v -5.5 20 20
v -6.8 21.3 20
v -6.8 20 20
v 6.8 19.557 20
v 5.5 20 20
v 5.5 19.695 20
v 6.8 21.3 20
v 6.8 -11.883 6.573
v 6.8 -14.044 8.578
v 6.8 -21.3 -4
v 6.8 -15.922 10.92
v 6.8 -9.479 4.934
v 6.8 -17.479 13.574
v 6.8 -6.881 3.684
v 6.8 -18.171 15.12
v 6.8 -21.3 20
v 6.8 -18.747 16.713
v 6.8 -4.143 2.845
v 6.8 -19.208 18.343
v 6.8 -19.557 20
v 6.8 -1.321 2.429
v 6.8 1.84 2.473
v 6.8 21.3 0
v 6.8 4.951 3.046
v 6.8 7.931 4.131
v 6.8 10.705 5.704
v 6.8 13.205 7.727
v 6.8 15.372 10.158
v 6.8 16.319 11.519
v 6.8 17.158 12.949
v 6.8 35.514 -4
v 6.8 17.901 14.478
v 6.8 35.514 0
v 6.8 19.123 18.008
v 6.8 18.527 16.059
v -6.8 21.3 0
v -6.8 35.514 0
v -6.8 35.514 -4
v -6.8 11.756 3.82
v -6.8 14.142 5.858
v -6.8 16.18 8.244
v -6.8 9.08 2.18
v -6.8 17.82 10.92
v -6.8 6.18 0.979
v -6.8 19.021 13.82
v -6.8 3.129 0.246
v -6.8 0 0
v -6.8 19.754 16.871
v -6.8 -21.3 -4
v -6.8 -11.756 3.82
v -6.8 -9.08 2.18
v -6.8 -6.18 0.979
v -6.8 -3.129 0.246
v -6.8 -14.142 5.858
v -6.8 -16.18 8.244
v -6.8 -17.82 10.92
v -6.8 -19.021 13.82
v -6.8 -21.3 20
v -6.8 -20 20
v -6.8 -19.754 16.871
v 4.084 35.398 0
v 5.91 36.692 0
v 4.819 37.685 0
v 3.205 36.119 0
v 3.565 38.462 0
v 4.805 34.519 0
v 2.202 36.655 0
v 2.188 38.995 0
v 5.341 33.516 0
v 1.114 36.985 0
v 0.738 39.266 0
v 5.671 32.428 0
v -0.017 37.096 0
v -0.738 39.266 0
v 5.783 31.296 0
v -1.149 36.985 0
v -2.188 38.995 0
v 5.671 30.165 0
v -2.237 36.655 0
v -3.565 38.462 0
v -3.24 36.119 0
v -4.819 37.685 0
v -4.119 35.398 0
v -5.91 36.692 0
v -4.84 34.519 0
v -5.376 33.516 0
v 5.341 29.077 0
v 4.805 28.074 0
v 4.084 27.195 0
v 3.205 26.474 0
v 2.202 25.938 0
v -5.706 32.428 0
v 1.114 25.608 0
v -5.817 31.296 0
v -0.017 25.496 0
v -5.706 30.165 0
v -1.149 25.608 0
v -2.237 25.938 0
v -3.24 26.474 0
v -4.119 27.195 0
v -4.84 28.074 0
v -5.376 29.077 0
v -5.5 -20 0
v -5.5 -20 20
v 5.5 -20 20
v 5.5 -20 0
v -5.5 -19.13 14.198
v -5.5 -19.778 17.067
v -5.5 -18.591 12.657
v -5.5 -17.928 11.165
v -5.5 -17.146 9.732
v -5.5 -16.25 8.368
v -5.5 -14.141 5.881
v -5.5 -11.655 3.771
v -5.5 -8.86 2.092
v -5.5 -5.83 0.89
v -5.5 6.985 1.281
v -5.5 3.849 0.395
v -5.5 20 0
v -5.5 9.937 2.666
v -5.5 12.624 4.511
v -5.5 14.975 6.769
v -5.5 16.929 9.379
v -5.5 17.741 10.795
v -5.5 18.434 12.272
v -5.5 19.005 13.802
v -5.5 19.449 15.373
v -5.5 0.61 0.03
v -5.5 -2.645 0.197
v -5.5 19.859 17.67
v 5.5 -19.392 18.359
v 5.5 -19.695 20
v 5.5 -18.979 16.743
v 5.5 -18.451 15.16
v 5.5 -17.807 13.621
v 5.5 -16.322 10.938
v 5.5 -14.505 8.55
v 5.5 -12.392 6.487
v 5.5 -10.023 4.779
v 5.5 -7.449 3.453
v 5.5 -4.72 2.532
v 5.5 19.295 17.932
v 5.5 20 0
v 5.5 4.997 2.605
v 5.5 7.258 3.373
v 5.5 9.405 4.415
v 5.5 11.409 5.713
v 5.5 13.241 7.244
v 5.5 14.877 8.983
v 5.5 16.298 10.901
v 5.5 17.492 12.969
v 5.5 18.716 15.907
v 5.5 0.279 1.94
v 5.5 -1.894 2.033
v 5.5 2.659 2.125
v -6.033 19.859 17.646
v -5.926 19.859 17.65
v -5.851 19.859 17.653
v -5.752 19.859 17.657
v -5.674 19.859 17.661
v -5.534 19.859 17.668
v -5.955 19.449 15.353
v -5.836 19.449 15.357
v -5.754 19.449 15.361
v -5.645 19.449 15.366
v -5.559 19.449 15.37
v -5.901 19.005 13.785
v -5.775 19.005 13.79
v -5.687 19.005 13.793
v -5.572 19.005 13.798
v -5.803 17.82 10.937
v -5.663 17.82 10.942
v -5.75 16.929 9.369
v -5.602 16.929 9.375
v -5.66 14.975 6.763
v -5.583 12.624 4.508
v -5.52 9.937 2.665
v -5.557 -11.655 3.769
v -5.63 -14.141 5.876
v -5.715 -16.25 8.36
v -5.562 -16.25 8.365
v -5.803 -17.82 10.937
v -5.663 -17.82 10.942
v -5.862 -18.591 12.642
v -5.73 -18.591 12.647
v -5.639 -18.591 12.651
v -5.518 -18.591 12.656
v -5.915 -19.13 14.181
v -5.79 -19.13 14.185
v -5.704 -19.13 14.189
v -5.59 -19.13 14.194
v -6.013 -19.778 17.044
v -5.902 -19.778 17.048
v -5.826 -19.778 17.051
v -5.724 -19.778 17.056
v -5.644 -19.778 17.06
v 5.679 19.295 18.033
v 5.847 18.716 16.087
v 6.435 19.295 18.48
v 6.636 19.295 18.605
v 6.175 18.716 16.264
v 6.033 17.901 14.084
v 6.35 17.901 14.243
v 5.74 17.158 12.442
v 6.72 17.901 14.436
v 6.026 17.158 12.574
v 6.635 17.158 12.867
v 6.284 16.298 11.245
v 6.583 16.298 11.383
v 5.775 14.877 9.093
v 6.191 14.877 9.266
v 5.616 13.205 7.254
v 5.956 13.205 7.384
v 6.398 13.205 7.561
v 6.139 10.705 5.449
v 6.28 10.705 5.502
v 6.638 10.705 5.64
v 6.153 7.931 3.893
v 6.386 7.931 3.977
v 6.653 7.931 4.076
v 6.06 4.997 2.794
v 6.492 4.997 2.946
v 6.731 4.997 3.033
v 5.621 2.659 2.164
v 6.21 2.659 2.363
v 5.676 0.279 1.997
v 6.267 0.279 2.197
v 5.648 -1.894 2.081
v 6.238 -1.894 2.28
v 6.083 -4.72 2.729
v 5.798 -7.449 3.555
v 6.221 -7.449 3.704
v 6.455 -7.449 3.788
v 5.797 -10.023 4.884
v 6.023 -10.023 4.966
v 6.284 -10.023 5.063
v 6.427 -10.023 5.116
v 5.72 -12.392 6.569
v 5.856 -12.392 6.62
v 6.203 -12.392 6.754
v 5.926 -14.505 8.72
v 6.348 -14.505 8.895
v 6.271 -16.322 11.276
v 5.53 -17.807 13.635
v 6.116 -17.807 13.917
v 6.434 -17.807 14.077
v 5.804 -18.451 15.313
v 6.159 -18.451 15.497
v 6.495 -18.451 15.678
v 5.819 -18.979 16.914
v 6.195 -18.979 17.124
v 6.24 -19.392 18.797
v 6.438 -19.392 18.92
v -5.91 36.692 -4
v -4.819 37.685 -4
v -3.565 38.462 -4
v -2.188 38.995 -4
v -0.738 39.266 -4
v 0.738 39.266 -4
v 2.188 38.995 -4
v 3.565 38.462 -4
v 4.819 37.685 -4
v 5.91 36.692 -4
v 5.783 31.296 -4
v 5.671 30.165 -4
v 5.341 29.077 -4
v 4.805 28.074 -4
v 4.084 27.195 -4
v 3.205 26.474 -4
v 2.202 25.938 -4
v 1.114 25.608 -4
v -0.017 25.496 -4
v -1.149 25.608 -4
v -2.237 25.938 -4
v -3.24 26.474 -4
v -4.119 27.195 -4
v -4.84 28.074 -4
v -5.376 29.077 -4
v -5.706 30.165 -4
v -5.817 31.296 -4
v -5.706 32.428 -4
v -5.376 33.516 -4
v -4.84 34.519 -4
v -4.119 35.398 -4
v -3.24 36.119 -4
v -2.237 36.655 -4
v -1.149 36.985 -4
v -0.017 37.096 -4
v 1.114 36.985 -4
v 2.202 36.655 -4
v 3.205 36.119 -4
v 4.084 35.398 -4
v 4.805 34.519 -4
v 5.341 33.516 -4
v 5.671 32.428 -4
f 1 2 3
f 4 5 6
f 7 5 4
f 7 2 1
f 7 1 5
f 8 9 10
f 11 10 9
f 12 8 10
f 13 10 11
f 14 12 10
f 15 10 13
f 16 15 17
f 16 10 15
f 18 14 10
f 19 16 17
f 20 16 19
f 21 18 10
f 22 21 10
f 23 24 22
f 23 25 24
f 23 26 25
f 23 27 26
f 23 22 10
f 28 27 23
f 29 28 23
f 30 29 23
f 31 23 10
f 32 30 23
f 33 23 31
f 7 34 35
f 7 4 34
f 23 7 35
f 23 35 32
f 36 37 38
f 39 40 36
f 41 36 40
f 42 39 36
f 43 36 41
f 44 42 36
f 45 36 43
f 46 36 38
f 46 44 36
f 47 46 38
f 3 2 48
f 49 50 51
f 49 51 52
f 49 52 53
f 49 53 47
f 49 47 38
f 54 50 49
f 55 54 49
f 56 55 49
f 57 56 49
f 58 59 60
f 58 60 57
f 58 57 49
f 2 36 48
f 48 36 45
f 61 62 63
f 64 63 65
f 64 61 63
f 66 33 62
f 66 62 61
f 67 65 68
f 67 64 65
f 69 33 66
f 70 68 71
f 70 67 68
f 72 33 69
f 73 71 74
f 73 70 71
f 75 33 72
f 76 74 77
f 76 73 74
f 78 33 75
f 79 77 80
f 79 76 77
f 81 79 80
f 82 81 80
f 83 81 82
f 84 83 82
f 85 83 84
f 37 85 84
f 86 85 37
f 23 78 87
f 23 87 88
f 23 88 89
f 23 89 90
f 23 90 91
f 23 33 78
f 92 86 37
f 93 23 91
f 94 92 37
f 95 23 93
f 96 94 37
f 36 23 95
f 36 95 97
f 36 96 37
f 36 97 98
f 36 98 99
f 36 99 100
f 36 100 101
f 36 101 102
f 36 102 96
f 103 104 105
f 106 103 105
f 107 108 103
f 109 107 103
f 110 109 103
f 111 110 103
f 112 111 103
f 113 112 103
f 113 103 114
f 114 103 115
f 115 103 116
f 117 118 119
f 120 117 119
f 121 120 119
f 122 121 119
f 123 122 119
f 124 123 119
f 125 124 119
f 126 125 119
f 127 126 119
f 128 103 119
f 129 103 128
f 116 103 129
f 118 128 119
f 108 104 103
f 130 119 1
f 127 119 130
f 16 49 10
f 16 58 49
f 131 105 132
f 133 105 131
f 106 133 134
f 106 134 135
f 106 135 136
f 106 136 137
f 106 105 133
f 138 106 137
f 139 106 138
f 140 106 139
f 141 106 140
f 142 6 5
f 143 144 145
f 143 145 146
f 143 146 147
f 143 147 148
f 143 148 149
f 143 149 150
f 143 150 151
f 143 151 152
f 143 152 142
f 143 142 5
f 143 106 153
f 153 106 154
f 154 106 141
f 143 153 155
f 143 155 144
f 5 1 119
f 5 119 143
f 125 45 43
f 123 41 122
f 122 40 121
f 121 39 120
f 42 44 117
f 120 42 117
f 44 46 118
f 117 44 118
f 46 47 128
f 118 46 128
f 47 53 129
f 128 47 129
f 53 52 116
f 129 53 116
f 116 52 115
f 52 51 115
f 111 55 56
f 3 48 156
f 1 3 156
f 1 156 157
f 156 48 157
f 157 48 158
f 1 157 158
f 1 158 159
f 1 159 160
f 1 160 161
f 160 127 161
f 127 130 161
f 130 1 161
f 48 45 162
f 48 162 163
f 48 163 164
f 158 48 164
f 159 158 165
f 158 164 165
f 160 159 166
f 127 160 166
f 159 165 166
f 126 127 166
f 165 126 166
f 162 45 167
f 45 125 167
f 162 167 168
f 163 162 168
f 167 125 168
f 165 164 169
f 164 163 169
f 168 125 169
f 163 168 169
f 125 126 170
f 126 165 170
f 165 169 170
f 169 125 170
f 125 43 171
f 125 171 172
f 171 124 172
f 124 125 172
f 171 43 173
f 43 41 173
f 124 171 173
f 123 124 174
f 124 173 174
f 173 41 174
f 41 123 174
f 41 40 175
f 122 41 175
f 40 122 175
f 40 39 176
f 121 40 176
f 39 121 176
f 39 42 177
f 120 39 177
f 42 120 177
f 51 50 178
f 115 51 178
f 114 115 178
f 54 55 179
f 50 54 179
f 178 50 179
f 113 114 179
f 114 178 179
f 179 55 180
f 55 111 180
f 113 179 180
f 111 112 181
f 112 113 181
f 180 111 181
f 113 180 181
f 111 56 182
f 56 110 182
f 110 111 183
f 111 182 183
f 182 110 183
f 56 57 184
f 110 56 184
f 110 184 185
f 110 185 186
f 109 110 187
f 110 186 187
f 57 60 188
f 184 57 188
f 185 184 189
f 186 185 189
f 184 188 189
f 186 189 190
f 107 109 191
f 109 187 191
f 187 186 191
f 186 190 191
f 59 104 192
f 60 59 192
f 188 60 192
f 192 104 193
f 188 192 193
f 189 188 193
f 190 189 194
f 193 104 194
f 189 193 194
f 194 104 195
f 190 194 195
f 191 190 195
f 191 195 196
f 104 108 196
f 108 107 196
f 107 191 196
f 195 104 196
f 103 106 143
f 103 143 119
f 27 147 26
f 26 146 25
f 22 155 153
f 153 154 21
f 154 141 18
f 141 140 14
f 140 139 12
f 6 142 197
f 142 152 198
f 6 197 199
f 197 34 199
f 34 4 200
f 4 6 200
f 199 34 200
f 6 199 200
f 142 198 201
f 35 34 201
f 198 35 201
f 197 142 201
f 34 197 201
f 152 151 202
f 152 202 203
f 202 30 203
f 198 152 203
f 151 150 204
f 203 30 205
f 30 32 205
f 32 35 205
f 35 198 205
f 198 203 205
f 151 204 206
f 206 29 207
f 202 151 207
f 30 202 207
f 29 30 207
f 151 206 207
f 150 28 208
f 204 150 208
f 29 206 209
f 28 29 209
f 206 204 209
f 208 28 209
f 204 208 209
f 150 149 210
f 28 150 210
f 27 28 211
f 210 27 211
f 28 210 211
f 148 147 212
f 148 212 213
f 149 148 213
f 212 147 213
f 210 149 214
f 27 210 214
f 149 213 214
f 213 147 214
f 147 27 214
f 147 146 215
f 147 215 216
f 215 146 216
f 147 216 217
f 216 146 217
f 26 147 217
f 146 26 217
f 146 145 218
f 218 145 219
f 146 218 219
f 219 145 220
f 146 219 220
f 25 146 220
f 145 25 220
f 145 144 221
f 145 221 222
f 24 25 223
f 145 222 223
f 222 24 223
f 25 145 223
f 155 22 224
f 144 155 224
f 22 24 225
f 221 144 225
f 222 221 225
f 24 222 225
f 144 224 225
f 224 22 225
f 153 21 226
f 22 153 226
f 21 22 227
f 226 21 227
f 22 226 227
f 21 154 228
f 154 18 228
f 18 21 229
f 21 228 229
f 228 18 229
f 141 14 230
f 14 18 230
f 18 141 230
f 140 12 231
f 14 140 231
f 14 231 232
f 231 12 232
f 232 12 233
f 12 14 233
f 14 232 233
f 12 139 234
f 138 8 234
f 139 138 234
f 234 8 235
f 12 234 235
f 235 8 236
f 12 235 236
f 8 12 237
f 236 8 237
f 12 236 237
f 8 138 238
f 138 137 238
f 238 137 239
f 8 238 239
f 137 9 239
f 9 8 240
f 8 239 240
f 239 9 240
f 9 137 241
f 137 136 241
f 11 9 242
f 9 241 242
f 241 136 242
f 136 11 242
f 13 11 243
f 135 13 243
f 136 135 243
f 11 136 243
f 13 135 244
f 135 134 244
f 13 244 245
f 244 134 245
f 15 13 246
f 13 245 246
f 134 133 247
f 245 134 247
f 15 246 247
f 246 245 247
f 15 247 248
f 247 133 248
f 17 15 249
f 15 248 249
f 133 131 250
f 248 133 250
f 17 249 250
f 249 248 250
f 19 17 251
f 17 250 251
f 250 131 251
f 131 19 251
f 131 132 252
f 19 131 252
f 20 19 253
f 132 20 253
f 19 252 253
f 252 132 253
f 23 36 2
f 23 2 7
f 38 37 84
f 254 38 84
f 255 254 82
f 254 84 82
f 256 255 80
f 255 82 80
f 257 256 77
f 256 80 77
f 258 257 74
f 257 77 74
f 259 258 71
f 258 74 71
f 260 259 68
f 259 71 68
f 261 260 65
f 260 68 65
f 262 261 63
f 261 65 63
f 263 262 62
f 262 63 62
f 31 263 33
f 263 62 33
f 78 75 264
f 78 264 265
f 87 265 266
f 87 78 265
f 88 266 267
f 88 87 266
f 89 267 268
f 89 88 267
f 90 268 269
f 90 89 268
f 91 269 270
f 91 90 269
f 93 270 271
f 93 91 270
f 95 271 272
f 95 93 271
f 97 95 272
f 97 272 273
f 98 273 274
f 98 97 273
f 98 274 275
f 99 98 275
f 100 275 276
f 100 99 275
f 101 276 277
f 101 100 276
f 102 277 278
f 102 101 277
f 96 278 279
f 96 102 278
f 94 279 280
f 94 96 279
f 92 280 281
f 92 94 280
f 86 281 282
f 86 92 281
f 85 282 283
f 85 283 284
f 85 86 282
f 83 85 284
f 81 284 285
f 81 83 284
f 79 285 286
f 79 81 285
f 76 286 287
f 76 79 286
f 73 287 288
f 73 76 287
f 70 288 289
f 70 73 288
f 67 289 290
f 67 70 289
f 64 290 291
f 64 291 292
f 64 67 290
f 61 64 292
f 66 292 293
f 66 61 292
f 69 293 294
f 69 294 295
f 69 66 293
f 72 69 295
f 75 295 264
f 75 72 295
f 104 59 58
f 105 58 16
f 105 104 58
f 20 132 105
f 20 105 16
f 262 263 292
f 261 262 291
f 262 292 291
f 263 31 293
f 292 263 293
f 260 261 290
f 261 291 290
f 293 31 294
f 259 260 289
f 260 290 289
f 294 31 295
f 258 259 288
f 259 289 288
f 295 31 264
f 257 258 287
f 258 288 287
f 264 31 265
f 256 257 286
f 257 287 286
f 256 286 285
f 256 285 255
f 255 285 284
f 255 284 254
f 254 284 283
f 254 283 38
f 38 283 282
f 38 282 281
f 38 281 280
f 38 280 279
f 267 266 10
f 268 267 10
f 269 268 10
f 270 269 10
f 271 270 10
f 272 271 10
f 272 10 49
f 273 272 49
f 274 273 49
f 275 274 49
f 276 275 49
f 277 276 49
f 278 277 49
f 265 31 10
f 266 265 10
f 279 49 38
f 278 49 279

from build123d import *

# Parameters (mm, degrees)
SKETCH001_W   = 13.6
SKETCH001_H   = 42.6
SKETCH001_W_2 = 11
SKETCH001_H_2 = 40
PAD_DEPTH     = 20
SKETCH002_R   = 20
SKETCH005_R   = 5.8
PAD001_DEPTH  = 4


with BuildPart() as part:
    # Sketch001 → Pad (new body)
    with BuildSketch(Plane.XY):
        Rectangle(SKETCH001_W, SKETCH001_H)
        Rectangle(SKETCH001_W_2, SKETCH001_H_2, mode=Mode.SUBTRACT)
    extrude(amount=PAD_DEPTH)

    # Sketch002 → Groove (revolve, cut)
    with BuildSketch(Plane(origin=(-6.8, 0, 0), x_dir=(0, -1, 0), z_dir=(-1, 0, 0))):
        with Locations((0, 20)):
            Circle(SKETCH002_R)
    revolve(axis=Axis((-6.8, 20, 40), (0, -1, 0)), mode=Mode.SUBTRACT)

    # Sketch005 → Pad001 (new body)
    with BuildSketch(Plane(origin=(0, 0, 0), x_dir=(1, 0, 0), z_dir=(0, 0, -1))):
        with BuildLine():
            Line((-6.8, 21.3), (6.8, 21.3))
            Line((6.8, 21.3), (6.8, -35.514262))
            ThreePointArc((-6.8, -35.514262), (0, -39.3), (6.8, -35.514262))
            Line((-6.8, -35.514262), (-6.8, 21.3))
        make_face()
        with Locations((-0.017483, -31.296471)):
            Circle(SKETCH005_R, mode=Mode.SUBTRACT)
    extrude(amount=PAD001_DEPTH)


solid = part.part
